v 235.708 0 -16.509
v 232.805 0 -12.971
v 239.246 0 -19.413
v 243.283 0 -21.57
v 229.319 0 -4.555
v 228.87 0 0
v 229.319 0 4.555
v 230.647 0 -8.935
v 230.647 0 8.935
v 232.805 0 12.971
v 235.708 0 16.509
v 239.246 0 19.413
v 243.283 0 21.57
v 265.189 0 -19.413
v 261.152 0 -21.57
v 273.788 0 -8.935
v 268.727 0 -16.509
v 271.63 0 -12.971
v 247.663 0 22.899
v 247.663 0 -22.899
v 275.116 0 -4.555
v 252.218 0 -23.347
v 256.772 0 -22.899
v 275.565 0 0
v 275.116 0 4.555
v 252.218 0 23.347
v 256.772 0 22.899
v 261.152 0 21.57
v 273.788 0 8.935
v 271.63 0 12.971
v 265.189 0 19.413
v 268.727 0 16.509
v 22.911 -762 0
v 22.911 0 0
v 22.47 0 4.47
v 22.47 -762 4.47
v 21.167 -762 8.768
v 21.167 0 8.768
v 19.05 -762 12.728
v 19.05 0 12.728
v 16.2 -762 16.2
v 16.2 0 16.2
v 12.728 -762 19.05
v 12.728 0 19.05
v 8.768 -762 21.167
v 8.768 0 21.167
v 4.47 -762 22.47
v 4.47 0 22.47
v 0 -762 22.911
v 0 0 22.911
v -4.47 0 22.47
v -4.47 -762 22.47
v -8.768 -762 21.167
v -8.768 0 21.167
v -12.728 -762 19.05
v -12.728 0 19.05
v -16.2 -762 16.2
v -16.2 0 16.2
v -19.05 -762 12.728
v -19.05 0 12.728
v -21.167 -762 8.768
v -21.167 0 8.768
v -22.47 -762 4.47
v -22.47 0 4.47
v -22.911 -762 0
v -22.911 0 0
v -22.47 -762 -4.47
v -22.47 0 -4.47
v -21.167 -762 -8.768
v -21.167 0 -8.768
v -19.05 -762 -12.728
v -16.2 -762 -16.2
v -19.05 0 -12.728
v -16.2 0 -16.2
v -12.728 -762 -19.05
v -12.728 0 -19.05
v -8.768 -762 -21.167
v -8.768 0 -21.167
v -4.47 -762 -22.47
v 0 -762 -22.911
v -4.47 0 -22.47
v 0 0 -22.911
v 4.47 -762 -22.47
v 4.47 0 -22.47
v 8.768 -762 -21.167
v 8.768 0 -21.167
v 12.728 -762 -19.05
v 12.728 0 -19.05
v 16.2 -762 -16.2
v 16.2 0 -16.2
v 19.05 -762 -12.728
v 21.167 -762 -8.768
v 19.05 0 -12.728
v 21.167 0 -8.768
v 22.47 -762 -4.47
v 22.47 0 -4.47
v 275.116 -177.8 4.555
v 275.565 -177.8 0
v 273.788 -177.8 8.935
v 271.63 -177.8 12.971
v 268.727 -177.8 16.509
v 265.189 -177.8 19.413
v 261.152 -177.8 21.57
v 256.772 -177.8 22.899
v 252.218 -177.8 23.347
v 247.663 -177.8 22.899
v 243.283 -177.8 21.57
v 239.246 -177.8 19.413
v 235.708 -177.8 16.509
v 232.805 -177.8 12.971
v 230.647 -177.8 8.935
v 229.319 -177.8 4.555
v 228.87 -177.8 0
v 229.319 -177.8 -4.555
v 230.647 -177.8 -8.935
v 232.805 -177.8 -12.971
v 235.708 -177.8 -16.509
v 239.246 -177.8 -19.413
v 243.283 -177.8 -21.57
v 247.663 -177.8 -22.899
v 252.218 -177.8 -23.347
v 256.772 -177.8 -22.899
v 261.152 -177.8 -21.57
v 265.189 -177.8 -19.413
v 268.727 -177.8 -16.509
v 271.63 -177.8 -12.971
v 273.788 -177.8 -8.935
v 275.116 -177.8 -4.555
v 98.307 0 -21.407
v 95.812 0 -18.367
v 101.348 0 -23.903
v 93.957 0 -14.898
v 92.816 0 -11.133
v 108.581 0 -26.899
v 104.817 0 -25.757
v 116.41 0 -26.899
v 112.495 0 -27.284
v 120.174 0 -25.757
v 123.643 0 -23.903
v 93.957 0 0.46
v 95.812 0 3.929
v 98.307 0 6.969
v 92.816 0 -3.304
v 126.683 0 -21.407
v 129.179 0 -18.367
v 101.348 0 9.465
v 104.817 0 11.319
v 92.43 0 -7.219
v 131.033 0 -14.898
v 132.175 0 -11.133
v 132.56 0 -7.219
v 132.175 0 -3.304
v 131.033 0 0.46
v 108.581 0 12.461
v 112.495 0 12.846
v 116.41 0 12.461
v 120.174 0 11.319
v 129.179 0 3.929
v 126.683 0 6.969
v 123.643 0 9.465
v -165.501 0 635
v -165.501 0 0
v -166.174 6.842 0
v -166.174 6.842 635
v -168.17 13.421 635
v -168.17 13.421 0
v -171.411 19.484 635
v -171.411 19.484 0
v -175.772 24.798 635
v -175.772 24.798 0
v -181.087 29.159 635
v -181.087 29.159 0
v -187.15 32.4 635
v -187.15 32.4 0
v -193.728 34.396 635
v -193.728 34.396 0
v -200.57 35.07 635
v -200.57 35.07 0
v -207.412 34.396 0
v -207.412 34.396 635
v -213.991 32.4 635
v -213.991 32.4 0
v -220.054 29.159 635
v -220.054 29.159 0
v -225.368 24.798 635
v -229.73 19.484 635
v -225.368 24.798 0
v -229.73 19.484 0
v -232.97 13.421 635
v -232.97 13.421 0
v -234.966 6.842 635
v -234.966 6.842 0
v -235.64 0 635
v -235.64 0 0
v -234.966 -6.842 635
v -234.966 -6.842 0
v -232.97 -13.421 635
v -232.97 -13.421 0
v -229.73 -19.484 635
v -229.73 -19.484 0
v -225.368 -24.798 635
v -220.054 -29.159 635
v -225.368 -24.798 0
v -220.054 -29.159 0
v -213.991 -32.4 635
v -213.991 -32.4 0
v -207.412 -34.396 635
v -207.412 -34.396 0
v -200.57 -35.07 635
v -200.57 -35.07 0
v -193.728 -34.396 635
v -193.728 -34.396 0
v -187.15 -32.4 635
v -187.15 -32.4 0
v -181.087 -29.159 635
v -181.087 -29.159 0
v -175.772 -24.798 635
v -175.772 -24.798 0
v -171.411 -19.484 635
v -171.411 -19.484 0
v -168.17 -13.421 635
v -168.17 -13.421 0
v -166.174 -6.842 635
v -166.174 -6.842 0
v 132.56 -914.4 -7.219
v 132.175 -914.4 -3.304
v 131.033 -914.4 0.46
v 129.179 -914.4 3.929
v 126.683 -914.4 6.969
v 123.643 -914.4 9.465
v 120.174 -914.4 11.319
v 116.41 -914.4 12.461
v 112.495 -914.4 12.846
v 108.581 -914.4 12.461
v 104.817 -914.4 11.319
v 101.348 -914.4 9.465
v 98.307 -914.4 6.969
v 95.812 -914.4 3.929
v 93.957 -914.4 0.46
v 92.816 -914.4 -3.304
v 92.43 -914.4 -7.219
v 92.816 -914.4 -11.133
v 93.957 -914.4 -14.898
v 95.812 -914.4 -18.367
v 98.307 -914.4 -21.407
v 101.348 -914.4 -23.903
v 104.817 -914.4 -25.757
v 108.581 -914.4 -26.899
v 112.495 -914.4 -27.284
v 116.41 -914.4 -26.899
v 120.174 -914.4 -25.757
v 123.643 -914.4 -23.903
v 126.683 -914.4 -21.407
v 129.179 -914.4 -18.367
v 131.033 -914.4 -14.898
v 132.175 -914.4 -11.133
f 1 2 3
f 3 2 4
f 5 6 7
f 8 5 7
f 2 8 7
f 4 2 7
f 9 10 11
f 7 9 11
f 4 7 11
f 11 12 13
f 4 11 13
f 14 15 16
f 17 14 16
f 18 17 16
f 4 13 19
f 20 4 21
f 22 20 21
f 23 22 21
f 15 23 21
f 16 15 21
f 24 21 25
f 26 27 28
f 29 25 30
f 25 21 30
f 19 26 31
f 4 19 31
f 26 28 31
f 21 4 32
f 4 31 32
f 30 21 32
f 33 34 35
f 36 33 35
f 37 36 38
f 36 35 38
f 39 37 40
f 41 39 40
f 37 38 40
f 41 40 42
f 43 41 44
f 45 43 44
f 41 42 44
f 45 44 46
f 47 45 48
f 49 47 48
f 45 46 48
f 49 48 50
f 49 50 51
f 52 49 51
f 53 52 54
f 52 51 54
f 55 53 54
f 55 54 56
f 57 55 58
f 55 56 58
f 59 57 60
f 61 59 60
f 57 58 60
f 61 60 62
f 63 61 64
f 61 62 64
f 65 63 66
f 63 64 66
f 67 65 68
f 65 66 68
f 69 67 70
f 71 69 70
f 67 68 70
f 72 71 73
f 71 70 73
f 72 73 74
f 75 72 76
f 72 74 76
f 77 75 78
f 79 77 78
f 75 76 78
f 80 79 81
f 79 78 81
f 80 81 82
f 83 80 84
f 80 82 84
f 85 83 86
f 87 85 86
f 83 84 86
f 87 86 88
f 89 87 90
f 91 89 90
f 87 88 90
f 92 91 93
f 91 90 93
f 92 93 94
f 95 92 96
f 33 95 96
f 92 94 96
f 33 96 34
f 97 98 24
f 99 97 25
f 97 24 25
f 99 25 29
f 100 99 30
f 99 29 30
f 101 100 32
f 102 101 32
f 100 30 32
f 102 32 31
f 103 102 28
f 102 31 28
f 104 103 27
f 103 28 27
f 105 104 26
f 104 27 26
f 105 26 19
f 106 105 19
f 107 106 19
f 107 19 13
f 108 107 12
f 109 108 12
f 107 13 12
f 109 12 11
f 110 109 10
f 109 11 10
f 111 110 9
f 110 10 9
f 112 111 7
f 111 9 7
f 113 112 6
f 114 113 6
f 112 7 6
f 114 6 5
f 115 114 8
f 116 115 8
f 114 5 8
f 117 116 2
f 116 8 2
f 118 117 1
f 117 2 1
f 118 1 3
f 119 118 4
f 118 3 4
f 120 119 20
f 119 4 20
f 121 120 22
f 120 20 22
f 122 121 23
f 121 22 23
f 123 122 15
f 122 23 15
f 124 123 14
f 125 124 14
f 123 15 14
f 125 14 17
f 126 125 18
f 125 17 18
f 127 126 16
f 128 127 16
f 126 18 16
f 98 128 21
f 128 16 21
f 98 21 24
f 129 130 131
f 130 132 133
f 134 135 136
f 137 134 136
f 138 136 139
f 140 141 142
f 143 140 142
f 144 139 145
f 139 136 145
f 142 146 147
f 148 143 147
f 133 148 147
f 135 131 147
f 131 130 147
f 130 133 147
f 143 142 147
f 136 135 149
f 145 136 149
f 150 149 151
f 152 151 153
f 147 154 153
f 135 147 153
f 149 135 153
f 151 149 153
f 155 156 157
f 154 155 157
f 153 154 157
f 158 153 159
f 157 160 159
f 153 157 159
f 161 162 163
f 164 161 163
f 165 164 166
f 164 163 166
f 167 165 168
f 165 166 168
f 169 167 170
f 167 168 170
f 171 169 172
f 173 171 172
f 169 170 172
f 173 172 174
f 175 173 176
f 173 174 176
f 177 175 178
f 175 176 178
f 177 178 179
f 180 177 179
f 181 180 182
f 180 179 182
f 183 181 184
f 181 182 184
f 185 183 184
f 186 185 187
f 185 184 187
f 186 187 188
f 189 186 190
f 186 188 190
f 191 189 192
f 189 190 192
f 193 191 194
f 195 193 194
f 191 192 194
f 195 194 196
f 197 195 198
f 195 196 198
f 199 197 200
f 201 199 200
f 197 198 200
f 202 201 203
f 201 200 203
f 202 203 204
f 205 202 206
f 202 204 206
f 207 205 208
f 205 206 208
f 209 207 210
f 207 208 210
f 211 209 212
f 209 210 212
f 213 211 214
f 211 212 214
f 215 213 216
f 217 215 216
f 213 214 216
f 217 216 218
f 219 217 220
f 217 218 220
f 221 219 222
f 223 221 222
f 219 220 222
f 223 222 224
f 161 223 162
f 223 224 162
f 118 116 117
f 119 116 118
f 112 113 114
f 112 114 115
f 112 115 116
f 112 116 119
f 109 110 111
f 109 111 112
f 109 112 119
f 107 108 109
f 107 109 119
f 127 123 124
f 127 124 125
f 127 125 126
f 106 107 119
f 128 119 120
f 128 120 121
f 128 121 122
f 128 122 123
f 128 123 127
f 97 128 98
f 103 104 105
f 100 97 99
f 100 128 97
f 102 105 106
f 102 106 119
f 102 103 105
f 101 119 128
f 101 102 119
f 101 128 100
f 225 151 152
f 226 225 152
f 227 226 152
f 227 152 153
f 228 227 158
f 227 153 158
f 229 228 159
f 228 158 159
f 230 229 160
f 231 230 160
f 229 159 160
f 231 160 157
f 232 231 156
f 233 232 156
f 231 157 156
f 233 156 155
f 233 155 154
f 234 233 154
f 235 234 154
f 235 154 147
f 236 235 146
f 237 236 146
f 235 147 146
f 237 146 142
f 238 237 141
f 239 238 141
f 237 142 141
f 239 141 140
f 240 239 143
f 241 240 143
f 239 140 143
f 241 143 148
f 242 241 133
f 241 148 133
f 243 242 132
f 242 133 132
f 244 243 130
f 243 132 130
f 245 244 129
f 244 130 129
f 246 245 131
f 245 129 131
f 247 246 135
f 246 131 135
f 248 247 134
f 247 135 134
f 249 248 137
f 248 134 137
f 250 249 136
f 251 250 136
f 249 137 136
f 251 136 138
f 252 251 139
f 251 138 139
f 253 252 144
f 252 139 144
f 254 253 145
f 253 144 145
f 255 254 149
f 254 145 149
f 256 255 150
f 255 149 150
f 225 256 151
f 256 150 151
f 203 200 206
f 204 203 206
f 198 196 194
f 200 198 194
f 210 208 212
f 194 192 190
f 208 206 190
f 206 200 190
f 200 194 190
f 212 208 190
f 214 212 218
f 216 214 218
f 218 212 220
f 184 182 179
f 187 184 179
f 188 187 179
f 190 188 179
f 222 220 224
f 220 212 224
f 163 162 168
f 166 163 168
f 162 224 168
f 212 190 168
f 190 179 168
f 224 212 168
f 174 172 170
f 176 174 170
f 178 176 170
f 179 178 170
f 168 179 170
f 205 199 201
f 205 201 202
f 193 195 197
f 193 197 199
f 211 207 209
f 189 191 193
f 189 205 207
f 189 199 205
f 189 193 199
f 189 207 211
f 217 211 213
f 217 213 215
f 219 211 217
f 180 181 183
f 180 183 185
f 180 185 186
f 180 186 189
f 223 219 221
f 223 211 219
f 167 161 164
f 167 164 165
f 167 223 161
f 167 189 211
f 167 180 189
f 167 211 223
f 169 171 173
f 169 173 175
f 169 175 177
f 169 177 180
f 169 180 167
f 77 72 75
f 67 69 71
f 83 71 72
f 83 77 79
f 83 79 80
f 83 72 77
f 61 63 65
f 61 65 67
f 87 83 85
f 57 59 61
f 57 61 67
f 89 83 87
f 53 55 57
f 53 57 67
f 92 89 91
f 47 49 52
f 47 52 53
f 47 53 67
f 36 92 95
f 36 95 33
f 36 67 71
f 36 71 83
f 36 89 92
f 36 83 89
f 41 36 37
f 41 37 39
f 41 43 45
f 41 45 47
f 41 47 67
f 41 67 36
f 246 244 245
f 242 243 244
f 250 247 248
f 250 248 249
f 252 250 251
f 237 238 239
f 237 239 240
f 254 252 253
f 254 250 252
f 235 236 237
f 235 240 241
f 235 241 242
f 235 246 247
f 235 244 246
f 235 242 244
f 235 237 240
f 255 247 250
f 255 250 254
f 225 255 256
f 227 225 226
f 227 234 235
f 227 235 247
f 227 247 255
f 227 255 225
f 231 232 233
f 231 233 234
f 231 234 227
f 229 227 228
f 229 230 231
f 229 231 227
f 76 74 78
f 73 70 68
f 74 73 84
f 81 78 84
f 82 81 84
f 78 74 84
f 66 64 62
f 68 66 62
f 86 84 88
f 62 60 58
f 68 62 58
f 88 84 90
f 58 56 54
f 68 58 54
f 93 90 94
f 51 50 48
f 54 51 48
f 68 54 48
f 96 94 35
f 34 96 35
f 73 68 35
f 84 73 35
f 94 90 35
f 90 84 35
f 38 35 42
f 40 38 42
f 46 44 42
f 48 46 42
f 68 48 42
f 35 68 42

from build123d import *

# Parameters (mm, degrees)
F0_R     = 22.910667
F1_DEPTH = 762
F2_R     = 20.065159
F3_DEPTH = 914.4
F4_R     = 35.069641
F5_DEPTH = 635
F6_R     = 23.347406
F7_DEPTH = 177.8


with BuildPart() as f1:
    # F0 (on Front) → F1 (new body)
    with BuildSketch(Plane.XZ):
        Circle(F0_R)
    extrude(amount=F1_DEPTH)


with BuildPart() as f3:
    # F2 (on Front) → F3 (new body)
    with BuildSketch(Plane.XZ):
        with Locations((112.495266, -7.218947)):
            Circle(F2_R)
    extrude(amount=F3_DEPTH)


with BuildPart() as f5:
    # F4 (on Top) → F5 (new body)
    with BuildSketch(Plane.XY):
        with Locations((-200.570181, 0)):
            Circle(F4_R)
    extrude(amount=F5_DEPTH)


with BuildPart() as f7:
    # F6 (on Front) → F7 (new body)
    with BuildSketch(Plane.XZ):
        with Locations((252.217591, 0)):
            Circle(F6_R)
    extrude(amount=F7_DEPTH)


solid = Compound([f1.part, f3.part, f5.part, f7.part])
